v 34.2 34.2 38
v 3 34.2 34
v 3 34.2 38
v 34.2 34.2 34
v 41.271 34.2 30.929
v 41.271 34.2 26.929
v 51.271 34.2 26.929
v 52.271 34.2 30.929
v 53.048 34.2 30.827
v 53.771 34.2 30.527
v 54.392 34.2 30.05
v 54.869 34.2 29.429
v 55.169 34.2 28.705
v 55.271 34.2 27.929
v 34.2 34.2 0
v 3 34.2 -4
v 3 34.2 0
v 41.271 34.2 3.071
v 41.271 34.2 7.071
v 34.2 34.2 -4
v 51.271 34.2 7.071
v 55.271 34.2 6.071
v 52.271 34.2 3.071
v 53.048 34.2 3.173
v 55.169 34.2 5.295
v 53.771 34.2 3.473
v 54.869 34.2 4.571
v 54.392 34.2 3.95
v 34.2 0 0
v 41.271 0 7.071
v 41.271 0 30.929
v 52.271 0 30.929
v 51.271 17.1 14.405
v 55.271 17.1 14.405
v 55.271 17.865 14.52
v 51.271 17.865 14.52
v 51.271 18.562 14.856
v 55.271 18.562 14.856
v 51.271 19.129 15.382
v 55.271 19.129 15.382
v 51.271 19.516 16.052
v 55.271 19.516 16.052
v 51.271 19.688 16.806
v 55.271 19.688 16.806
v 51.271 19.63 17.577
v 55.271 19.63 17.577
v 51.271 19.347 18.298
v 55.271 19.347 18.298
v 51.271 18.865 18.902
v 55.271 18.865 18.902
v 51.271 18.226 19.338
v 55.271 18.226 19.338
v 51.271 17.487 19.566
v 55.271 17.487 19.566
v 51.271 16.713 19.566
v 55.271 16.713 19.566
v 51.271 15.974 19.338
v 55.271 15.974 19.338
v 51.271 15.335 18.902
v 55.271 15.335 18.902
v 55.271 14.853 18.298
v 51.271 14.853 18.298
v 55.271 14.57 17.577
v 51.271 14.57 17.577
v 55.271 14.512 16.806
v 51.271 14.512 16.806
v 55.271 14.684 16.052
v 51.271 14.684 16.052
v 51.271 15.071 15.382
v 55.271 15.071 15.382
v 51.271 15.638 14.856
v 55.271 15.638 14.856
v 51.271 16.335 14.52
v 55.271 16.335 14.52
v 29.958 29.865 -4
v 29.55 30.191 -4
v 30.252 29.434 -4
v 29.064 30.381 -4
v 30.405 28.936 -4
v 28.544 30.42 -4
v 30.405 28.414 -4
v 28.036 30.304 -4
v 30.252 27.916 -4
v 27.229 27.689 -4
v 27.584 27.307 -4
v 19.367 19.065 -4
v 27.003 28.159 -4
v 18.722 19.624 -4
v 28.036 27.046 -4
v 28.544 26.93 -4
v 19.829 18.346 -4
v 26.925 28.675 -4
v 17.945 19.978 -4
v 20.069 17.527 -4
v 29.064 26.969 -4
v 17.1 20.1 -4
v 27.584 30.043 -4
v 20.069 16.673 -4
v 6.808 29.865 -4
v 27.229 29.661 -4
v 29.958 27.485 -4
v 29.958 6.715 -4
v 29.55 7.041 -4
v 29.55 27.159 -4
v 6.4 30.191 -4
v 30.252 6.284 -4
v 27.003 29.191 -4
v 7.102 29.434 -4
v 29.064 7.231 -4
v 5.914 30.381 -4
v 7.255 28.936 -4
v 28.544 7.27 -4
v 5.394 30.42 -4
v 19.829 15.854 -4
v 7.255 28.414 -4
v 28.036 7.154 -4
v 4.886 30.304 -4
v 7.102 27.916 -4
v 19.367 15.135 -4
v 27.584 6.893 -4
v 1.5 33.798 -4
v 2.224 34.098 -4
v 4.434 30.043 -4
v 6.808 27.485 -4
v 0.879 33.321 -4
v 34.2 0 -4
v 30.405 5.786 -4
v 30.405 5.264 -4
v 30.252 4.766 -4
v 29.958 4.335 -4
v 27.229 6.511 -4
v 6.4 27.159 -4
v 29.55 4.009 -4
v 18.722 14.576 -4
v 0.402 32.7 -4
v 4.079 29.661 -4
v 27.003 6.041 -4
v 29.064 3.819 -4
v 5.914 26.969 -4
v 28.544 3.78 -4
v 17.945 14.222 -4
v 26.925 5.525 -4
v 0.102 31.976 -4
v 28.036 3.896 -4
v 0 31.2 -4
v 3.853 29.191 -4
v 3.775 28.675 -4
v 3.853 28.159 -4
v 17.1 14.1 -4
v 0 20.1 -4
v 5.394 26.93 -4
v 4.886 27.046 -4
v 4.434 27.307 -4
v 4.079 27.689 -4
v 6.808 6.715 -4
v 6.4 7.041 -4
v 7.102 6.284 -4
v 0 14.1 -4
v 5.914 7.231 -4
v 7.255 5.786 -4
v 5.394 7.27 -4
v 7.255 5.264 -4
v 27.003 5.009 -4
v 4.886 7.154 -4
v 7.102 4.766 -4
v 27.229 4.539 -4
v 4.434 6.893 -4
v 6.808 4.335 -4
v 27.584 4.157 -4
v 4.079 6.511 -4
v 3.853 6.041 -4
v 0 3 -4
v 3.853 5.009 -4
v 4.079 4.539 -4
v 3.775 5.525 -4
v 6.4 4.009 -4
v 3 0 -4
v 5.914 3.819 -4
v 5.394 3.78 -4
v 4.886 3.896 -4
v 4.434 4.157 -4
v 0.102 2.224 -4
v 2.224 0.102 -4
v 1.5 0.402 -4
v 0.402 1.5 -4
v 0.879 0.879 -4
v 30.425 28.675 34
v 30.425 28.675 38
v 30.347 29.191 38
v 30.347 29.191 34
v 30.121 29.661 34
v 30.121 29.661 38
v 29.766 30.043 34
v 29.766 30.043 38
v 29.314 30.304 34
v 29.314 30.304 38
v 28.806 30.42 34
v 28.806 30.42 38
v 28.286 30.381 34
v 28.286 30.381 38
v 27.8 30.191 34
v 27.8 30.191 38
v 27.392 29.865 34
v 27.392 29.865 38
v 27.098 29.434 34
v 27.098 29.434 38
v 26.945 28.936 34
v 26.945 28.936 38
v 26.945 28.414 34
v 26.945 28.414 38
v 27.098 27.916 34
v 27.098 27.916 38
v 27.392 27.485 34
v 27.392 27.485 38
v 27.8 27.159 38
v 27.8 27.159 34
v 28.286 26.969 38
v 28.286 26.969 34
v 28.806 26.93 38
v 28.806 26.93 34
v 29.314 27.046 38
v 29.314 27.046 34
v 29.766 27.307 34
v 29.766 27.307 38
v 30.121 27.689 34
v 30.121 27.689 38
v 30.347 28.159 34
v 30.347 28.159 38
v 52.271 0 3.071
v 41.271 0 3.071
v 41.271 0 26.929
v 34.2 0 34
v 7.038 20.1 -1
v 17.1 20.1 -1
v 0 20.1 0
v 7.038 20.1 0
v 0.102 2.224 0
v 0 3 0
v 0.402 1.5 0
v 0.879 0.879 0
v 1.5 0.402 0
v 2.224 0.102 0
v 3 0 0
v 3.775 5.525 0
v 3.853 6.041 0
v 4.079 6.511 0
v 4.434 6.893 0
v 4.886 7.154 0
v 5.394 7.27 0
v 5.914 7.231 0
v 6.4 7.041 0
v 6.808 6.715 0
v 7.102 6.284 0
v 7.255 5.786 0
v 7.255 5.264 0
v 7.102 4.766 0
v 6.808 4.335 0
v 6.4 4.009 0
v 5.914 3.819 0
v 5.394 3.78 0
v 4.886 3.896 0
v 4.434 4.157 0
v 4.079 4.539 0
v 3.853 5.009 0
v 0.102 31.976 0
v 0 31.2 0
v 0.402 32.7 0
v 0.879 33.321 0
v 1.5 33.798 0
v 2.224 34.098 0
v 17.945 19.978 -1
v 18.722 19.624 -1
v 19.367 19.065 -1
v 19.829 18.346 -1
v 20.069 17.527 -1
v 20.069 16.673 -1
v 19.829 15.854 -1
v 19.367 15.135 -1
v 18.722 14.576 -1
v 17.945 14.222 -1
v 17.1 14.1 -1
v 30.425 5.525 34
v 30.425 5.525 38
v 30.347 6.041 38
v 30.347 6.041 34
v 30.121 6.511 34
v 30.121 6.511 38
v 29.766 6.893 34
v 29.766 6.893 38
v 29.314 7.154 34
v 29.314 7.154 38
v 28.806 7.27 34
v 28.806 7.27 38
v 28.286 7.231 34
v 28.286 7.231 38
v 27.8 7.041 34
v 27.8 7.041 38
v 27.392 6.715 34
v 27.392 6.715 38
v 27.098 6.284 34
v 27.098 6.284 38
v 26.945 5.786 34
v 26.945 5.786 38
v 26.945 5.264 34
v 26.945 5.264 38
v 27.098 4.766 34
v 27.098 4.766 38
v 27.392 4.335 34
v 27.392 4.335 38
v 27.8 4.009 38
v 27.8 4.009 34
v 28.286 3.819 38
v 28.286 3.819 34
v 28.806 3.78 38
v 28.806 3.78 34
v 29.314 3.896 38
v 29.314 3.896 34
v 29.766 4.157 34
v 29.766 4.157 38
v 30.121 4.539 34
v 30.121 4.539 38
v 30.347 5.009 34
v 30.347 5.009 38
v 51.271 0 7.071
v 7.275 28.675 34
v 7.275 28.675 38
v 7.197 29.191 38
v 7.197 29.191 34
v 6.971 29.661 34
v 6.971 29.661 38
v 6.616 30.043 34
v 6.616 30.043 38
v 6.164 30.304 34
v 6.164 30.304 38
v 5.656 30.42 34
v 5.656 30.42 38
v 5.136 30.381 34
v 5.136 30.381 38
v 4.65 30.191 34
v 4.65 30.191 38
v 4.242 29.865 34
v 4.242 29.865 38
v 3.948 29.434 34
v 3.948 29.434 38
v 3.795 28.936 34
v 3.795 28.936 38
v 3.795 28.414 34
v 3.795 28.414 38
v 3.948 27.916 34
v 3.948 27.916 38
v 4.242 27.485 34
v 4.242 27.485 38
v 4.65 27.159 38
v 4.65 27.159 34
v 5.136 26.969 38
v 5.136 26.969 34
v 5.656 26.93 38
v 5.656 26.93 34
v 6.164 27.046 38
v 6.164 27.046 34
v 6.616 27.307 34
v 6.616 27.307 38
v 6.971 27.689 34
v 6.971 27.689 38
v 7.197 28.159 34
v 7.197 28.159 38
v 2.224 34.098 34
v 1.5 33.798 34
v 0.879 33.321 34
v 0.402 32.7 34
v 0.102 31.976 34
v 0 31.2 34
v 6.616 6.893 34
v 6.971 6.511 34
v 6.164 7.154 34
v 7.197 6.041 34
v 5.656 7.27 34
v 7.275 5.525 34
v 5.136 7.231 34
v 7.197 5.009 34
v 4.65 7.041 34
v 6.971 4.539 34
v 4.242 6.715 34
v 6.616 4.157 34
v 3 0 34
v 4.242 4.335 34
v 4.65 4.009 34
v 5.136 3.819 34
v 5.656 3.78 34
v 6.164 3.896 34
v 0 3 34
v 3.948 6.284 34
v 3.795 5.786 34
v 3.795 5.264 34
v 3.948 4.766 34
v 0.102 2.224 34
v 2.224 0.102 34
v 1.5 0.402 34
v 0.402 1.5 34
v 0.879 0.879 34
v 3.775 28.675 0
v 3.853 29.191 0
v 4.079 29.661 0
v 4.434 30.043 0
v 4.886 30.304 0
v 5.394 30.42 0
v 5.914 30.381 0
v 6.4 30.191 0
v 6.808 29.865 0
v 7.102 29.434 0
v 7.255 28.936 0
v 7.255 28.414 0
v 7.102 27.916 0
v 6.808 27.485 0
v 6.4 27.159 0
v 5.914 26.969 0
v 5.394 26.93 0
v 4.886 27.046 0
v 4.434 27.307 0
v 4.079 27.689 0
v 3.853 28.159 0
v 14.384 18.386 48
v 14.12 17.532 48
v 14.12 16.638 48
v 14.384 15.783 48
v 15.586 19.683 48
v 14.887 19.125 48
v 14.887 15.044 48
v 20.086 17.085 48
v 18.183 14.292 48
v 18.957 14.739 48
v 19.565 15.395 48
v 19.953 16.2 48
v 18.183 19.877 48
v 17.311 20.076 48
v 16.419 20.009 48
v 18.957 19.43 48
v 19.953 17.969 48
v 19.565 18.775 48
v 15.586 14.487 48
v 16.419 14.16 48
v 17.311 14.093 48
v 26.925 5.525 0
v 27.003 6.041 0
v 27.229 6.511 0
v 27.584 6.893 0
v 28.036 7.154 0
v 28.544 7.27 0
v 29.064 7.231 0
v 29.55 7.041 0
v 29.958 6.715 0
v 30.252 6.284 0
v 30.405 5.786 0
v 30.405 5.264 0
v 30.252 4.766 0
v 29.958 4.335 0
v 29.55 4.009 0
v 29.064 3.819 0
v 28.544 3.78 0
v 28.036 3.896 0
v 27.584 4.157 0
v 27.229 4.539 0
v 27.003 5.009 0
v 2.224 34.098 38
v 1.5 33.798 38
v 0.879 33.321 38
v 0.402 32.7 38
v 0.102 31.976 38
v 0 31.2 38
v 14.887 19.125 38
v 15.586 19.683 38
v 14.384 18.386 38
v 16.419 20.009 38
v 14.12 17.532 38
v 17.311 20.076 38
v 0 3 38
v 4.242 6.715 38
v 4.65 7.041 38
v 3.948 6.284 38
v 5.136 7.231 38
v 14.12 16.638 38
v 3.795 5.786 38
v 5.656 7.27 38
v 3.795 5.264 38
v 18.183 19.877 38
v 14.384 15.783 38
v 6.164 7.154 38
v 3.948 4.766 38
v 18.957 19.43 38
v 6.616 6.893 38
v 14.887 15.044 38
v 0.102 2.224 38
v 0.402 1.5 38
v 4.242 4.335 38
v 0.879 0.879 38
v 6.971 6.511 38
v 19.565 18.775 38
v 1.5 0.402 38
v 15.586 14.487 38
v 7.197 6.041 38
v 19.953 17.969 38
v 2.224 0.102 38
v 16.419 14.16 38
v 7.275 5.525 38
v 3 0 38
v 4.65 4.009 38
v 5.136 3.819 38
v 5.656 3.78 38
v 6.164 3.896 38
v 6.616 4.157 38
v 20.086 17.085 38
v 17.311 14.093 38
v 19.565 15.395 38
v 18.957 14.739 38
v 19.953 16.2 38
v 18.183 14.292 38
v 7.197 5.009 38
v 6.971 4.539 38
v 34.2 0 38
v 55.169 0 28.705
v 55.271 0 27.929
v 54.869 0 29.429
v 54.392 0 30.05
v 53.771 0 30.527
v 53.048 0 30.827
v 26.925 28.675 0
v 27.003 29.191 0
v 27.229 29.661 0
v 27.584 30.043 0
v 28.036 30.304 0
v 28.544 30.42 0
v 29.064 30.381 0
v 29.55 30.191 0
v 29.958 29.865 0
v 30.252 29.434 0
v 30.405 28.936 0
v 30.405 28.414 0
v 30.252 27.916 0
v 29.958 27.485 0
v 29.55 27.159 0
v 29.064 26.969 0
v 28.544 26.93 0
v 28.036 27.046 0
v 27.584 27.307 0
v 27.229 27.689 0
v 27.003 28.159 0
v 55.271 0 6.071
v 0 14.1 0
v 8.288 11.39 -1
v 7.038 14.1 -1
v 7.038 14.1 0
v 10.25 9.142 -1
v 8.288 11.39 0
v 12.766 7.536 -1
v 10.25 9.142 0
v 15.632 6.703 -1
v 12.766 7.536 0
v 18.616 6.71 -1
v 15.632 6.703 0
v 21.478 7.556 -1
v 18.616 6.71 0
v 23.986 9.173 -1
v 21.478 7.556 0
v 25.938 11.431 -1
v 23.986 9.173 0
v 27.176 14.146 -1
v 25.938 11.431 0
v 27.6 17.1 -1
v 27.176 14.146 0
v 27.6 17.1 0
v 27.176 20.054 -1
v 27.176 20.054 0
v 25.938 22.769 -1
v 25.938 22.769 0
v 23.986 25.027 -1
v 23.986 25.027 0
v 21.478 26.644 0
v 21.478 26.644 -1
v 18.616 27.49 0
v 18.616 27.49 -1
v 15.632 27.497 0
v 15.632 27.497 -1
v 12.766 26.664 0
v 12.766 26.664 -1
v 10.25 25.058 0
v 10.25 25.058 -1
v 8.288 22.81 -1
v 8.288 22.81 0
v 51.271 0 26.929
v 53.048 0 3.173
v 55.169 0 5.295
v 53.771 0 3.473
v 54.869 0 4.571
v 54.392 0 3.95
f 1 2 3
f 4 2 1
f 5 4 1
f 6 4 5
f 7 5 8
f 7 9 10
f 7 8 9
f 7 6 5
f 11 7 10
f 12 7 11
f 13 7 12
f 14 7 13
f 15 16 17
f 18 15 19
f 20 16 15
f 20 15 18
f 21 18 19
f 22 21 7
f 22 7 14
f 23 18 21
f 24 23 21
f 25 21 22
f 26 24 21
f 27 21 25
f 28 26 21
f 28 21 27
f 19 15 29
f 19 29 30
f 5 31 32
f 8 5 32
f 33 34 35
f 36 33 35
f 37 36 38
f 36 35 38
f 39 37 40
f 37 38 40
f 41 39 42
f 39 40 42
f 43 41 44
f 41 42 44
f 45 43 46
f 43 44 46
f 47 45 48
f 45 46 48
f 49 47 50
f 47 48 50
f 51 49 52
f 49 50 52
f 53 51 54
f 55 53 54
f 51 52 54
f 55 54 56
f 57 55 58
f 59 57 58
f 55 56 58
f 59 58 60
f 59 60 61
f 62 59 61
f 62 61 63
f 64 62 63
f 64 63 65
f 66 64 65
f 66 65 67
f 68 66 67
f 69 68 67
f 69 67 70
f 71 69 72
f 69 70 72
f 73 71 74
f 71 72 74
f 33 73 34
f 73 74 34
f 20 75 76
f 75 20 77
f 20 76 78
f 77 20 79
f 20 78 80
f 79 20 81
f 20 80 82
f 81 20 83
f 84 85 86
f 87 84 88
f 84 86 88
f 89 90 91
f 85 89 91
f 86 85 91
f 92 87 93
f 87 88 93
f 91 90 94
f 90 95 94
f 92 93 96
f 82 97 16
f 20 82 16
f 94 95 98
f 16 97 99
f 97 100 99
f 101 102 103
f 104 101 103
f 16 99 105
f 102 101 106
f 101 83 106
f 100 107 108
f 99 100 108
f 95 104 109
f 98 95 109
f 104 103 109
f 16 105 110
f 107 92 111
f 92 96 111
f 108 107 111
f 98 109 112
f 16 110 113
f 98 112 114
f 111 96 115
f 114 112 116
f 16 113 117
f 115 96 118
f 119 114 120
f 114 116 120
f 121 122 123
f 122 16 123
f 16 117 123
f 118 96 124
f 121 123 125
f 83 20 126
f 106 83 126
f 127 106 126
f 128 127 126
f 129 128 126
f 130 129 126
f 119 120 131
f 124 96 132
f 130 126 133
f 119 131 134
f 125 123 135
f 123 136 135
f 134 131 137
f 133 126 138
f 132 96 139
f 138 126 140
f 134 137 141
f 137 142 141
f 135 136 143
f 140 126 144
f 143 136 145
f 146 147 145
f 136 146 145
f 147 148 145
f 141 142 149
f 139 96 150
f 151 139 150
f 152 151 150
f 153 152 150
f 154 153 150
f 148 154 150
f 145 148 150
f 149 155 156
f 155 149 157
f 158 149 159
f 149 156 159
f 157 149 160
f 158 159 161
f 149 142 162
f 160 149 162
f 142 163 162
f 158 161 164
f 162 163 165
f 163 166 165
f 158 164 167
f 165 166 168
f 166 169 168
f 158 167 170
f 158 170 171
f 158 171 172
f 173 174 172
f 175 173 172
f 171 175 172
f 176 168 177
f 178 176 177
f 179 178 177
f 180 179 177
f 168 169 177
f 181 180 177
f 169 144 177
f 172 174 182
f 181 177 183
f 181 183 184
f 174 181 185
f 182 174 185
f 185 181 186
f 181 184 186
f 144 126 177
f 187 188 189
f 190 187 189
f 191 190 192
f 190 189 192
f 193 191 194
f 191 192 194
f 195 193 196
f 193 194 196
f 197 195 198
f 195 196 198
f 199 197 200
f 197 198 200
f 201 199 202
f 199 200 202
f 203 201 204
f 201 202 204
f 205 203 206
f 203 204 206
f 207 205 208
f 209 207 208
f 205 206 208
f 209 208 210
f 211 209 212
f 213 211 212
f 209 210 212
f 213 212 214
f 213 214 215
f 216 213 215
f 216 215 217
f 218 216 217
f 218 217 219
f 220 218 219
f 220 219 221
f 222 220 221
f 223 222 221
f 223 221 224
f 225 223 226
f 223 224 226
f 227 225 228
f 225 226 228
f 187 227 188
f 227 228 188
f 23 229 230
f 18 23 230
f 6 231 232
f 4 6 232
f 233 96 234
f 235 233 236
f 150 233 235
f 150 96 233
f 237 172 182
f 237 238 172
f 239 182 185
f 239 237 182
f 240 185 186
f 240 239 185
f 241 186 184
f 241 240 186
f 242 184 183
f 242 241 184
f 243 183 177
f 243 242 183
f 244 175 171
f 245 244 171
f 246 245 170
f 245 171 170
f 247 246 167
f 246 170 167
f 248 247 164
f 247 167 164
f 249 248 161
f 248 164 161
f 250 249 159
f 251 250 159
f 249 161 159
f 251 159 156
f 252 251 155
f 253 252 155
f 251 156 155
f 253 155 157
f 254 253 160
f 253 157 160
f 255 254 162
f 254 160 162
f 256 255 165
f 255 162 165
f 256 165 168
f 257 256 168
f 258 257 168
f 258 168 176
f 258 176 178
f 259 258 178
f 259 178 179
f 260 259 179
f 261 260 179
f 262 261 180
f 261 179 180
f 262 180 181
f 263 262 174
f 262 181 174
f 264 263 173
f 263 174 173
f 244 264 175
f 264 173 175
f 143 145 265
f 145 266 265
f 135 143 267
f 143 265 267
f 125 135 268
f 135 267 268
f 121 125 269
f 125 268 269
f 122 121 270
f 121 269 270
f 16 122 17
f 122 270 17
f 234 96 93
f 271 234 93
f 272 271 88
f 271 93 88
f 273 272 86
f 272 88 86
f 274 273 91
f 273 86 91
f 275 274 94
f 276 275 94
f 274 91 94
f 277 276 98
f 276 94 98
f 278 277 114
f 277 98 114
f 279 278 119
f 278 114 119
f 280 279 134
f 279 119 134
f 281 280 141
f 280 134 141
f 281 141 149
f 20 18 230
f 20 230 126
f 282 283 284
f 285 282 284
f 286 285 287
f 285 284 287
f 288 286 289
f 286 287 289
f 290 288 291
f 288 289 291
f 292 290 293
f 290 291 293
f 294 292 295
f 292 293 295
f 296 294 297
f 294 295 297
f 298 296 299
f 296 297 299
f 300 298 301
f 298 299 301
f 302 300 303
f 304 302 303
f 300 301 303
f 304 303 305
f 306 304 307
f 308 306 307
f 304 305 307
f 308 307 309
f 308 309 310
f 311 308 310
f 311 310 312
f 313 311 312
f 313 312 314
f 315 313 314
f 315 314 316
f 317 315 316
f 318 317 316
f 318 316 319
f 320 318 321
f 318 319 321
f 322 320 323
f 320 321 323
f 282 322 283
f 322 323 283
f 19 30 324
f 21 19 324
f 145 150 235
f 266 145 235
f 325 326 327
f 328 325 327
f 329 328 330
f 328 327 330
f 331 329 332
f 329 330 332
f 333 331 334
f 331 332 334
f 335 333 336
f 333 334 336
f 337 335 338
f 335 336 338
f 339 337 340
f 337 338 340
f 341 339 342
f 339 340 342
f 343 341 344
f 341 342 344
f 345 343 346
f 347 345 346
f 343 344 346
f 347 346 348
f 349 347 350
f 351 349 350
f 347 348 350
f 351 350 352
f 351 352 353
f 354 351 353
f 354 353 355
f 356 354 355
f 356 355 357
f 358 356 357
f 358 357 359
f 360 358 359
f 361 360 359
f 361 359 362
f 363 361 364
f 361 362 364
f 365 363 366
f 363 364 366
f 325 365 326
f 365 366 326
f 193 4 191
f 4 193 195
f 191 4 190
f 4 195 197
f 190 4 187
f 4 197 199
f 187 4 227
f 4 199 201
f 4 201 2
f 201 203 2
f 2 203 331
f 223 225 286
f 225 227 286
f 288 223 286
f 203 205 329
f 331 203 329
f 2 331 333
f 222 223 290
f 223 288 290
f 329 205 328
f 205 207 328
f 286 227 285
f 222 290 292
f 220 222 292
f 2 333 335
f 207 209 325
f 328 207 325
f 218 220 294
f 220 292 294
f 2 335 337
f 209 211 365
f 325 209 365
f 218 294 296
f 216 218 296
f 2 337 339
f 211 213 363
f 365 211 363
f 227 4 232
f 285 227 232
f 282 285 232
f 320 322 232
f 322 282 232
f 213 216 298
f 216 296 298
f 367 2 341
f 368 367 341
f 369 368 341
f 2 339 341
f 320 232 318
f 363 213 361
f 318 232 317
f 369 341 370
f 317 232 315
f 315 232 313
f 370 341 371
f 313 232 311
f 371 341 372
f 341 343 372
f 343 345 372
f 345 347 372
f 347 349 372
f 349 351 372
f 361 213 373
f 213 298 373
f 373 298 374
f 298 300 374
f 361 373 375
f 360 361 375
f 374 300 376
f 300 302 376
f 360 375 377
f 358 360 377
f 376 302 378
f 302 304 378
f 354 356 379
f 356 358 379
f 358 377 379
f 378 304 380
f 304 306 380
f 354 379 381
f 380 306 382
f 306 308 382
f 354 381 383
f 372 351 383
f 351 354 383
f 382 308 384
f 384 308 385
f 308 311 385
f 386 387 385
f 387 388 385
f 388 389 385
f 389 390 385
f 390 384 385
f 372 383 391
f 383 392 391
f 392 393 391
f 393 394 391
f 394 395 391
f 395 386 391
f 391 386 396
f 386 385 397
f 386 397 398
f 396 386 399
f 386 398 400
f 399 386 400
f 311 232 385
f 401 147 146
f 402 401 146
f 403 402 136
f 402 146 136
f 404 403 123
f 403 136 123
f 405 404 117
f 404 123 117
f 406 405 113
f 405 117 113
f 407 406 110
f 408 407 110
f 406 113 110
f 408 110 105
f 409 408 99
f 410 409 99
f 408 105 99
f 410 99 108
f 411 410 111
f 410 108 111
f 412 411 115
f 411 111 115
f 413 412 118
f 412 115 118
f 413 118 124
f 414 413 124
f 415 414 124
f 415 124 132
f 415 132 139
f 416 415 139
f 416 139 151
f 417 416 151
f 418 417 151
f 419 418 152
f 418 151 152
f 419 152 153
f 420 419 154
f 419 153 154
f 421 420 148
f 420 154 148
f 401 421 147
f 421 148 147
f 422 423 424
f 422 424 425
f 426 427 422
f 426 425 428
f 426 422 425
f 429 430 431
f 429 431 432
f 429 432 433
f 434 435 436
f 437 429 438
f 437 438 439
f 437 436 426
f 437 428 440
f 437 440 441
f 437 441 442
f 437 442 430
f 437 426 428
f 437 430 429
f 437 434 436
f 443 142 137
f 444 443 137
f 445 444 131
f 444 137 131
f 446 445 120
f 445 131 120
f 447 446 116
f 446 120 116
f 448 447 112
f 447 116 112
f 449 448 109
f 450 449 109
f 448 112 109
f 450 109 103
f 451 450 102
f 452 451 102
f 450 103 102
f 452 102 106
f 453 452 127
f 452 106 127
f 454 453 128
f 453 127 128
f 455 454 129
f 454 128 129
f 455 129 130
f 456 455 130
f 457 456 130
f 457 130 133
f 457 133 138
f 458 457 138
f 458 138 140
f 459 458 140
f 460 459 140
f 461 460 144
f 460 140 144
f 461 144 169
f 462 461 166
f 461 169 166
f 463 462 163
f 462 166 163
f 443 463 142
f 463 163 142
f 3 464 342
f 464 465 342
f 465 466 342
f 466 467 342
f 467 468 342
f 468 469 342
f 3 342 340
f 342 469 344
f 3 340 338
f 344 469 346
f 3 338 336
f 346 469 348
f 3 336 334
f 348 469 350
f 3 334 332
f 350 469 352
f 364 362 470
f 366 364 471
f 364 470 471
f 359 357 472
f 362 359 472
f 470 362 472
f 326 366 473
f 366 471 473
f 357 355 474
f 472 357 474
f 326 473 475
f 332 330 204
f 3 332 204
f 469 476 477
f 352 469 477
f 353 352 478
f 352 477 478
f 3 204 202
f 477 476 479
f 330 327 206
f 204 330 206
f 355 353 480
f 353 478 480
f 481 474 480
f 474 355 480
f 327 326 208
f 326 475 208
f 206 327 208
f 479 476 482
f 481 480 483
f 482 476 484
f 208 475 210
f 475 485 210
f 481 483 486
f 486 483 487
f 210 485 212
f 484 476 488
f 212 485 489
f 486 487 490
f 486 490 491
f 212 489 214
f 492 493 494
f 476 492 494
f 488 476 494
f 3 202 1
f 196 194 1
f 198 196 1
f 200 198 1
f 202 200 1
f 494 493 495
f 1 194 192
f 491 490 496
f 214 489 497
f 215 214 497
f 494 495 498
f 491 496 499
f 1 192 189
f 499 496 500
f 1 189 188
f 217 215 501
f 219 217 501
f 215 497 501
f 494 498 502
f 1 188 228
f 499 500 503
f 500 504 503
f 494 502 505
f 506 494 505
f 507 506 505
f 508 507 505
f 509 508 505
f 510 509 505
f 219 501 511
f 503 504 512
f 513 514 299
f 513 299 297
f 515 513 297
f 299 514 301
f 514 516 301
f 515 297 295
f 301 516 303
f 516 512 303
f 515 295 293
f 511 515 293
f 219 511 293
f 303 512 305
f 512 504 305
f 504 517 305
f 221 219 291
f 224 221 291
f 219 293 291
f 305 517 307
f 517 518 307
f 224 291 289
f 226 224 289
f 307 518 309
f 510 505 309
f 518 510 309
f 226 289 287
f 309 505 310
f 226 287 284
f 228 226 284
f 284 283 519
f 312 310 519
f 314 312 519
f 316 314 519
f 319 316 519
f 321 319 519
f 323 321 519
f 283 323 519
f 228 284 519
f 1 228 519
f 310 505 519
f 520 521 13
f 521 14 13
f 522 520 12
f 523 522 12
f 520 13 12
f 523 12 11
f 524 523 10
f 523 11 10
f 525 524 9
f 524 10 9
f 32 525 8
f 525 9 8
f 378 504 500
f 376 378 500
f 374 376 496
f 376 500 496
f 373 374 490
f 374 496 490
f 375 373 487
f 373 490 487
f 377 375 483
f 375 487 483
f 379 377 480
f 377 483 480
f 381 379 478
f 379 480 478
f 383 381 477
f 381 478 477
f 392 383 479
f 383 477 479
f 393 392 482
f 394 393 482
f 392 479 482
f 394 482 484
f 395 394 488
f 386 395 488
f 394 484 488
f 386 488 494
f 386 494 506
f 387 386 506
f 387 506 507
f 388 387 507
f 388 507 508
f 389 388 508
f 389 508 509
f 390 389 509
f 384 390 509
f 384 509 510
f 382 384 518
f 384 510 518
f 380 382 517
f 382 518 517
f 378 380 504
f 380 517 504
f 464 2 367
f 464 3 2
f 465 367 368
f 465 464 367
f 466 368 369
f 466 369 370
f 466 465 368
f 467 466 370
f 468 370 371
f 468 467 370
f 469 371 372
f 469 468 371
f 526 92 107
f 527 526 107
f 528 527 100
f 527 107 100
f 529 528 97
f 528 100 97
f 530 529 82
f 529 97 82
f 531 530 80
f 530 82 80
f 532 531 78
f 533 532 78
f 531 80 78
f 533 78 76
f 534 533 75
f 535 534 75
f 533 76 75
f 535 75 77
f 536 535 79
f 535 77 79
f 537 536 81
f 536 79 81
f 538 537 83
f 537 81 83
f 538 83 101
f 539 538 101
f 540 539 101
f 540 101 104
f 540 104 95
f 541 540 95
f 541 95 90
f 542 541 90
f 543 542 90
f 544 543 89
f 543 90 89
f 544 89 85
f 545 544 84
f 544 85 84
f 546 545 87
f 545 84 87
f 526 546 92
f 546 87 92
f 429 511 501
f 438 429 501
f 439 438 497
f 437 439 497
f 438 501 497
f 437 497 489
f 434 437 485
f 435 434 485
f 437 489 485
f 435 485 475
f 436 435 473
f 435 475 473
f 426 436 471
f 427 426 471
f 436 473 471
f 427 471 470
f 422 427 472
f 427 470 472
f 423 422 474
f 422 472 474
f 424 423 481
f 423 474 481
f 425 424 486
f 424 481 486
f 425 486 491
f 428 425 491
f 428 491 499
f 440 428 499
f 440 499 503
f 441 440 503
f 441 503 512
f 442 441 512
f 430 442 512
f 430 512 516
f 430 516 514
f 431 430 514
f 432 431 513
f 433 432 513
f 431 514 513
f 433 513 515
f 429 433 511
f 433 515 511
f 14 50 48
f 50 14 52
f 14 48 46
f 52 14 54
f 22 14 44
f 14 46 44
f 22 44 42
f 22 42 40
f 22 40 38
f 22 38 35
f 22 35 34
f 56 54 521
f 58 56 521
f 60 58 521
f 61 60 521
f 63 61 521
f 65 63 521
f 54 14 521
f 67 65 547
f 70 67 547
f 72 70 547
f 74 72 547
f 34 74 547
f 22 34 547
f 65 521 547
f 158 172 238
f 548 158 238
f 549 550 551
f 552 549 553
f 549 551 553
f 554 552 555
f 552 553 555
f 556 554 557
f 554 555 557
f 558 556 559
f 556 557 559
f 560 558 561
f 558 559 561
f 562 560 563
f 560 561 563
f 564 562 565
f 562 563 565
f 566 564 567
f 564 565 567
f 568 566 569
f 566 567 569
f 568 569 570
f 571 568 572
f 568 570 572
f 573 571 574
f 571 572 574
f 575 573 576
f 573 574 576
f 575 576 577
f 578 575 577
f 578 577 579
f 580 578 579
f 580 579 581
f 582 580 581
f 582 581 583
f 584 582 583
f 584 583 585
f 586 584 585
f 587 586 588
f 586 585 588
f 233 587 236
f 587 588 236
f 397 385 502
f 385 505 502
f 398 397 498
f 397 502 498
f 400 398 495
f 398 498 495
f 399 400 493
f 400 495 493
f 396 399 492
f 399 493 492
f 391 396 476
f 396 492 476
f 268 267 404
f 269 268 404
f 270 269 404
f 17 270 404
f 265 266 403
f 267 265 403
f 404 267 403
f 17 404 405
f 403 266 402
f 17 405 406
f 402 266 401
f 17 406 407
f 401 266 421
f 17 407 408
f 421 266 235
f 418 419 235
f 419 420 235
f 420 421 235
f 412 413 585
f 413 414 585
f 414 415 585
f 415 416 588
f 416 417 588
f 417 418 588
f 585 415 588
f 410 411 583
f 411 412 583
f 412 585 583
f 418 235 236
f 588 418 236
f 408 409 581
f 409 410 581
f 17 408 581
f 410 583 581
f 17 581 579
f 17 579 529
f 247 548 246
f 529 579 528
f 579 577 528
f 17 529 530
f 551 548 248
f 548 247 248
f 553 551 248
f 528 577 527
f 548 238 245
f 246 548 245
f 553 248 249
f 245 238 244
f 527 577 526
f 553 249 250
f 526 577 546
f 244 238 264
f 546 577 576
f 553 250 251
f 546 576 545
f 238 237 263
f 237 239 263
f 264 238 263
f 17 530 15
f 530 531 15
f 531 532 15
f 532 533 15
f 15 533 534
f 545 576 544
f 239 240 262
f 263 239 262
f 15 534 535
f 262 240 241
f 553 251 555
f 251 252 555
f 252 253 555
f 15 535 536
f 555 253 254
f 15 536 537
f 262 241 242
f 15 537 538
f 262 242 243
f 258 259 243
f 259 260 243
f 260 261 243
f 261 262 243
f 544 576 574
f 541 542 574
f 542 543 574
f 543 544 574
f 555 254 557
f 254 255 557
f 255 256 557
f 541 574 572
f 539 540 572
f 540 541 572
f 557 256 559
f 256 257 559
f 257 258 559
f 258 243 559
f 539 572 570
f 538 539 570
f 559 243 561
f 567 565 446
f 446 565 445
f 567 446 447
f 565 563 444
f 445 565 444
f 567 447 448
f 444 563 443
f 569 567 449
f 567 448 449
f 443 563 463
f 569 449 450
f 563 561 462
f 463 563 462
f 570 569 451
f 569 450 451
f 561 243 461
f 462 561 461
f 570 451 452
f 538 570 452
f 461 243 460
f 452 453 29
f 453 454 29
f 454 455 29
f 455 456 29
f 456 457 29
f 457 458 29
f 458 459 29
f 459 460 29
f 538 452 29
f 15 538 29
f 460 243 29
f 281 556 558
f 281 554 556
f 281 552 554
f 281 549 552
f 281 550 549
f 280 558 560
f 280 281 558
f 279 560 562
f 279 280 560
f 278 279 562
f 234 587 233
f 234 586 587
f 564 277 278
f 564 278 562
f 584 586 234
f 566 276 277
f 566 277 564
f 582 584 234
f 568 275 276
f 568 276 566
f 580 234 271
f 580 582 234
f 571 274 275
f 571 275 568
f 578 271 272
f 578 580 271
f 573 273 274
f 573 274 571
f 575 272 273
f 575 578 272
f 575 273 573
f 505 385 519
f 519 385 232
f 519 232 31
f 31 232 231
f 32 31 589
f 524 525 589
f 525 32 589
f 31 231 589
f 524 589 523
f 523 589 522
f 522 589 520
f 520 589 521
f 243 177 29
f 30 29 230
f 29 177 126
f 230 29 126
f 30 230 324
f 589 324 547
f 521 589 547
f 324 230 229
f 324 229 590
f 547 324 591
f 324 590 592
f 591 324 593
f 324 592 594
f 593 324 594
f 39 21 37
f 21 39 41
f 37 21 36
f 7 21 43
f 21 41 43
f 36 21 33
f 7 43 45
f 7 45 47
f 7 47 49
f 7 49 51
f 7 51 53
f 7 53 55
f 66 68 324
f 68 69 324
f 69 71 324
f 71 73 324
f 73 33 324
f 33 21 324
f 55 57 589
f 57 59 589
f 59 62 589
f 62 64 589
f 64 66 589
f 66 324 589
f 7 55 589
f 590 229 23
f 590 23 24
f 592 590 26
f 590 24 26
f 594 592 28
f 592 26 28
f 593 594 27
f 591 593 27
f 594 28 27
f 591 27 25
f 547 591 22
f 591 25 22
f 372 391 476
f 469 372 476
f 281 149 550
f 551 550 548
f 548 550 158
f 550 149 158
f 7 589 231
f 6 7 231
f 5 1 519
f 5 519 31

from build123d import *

# Parameters (mm, degrees)
BOSS_EXTRUDE1_DEPTH = 34.2
SKETCH2_R           = 1.75
SKETCH2_R_2         = 3
CUT_EXTRUDE2_DEPTH  = 4
SKETCH3_R           = 10.5
CUT_EXTRUDE3_DEPTH  = 1
SKETCH5_R           = 1.75
CUT_EXTRUDE7_DEPTH  = 4
FILLET2_R           = 3
FILLET3_R           = 3
SKETCH12_R          = 2.595
CUT_EXTRUDE8_DEPTH  = 4
SKETCH14_W          = 17.1
SKETCH14_H          = 6
CUT_EXTRUDE9_DEPTH  = 4
SKETCH15_R          = 3
BOSS_EXTRUDE2_DEPTH = 10


with BuildPart() as part:
    # Sketch1 → Boss-Extrude1 (new body)
    with BuildSketch(Plane(origin=(0, 0, 0), x_dir=(1, 0, 0), z_dir=(0, 1, 0))):
        Polygon((0, 0), (34.2, 0), (41.271067812, -7.071067812), (51.271067812, -7.071067812), (51.271067812, -26.928932188), (41.271067812, -26.928932188), (34.2, -34), (0, -34), (0, -38), (34.2, -38), (41.271067812, -30.928932188), (55.271067812, -30.928932188), (55.271067812, -26.928932188), (55.271067812, -3.071067812), (51.271067812, -3.071067812), (41.271067812, -3.071067812), (34.2, 4), (0, 4), align=None)
    extrude(amount=BOSS_EXTRUDE1_DEPTH)

    # Sketch2 → Cut-Extrude2 (cut)
    with BuildSketch(Plane(origin=(0, 0, -4), x_dir=(-1, 0, 0), z_dir=(0, 0, -1))):
        with Locations((-28.675, 28.675)):
            Circle(SKETCH2_R)
        with Locations((-5.525, 28.675)):
            Circle(SKETCH2_R)
        with Locations((-5.525, 5.525)):
            Circle(SKETCH2_R)
        with Locations((-28.675, 5.525)):
            Circle(SKETCH2_R)
        with Locations((-17.1, 17.1)):
            Circle(SKETCH2_R_2)
    extrude(amount=-CUT_EXTRUDE2_DEPTH, mode=Mode.SUBTRACT)

    # Sketch3 → Cut-Extrude3 (cut)
    with BuildSketch(Plane.XY):
        with Locations((17.1, 17.1)):
            Circle(SKETCH3_R)
    extrude(amount=-CUT_EXTRUDE3_DEPTH, mode=Mode.SUBTRACT)

    # Sketch5 → Cut-Extrude7 (cut)
    with BuildSketch(Plane.XY.offset(38)):
        with Locations((28.675, 28.675)):
            Circle(SKETCH5_R)
        with Locations((5.525, 28.675)):
            Circle(SKETCH5_R)
        with Locations((5.525, 5.525)):
            Circle(SKETCH5_R)
        with Locations((28.675, 5.525)):
            Circle(SKETCH5_R)
    extrude(amount=-CUT_EXTRUDE7_DEPTH, mode=Mode.SUBTRACT)

    # Fillet2
    fillet2_edges = [part.edges().sort_by_distance(p)[0] for p in [
        (0, 0, 36),
        (0, 0, -2),
        (0, 34.2, 36),
        (0, 34.2, -2),
    ]]
    fillet(fillet2_edges, radius=FILLET2_R)

    # Fillet3
    fillet3_edges = [part.edges().sort_by_distance(p)[0] for p in [
        (55.271067812, 17.1, 3.071067812),
        (55.271067812, 17.1, 30.928932188),
    ]]
    fillet(fillet3_edges, radius=FILLET3_R)

    # Sketch12 → Cut-Extrude8 (cut)
    with BuildSketch(Plane(origin=(55.271067812, 0, 0), x_dir=(0, 0, -1), z_dir=(1, 0, 0))):
        with Locations((-17, 17.1)):
            Circle(SKETCH12_R)
    extrude(amount=-CUT_EXTRUDE8_DEPTH, mode=Mode.SUBTRACT)

    # Sketch14 → Cut-Extrude9 (cut)
    with BuildSketch(Plane(origin=(0, 0, -4), x_dir=(-1, 0, 0), z_dir=(0, 0, -1))):
        with Locations((-8.55, 17.1)):
            Rectangle(SKETCH14_W, SKETCH14_H)
    extrude(amount=-CUT_EXTRUDE9_DEPTH, mode=Mode.SUBTRACT)

    # Sketch15 → Boss-Extrude2 (add)
    with BuildSketch(Plane.XY.offset(38)):
        with Locations((17.086482483, 17.08469774)):
            Circle(SKETCH15_R)
    extrude(amount=BOSS_EXTRUDE2_DEPTH)


solid = part.part
